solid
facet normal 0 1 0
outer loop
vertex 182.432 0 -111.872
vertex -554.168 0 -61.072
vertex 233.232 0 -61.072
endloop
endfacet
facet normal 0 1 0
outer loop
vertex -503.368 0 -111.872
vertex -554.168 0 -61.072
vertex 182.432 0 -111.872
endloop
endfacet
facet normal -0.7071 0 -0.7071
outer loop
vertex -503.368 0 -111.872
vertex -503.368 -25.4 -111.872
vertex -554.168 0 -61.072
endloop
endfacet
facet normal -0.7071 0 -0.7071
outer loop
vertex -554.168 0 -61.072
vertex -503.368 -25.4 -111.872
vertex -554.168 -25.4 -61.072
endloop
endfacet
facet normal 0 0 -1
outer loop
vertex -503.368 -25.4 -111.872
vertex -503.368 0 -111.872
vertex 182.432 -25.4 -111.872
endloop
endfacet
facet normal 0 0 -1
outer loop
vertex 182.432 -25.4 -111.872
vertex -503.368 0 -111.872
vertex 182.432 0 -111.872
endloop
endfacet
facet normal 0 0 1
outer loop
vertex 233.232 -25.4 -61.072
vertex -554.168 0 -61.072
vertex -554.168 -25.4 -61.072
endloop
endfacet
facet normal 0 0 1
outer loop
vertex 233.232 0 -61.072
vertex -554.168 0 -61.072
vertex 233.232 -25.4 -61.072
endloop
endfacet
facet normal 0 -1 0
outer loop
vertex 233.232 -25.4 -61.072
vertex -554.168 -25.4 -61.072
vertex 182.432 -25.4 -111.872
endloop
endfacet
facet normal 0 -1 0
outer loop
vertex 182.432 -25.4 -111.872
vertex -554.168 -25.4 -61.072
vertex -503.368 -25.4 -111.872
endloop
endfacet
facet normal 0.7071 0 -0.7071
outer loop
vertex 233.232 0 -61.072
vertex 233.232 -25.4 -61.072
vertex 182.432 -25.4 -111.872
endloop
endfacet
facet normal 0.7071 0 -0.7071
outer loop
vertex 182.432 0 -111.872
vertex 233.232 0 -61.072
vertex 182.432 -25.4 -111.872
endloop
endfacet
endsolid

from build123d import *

# Parameters (mm, degrees)
F0_W     = 787.4
F0_H     = 50.8
F1_DEPTH = 25.4
F3_DEPTH = 25.4
F5_DEPTH = 25.4


with BuildPart() as f1:
    # F0 (on Front) → F1 (new body)
    with BuildSketch(Plane.XZ):
        with Locations((-160.468298, -86.47181)):
            Rectangle(F0_W, F0_H)
    extrude(amount=F1_DEPTH)

    # F2 (on face) → F3 (cut)
    with BuildSketch(Plane.XZ.offset(25.4)):
        Polygon((182.431702, -111.87181), (233.231702, -111.87181), (233.231702, -61.07181), align=None)
    extrude(amount=-F3_DEPTH, mode=Mode.SUBTRACT)

    # F4 (on face) → F5 (cut)
    with BuildSketch(Plane.XZ.offset(25.4)):
        Polygon((-554.168298, -61.07181), (-554.168298, -111.87181), (-503.368298, -111.87181), align=None)
    extrude(amount=-F5_DEPTH, mode=Mode.SUBTRACT)


solid = f1.part
